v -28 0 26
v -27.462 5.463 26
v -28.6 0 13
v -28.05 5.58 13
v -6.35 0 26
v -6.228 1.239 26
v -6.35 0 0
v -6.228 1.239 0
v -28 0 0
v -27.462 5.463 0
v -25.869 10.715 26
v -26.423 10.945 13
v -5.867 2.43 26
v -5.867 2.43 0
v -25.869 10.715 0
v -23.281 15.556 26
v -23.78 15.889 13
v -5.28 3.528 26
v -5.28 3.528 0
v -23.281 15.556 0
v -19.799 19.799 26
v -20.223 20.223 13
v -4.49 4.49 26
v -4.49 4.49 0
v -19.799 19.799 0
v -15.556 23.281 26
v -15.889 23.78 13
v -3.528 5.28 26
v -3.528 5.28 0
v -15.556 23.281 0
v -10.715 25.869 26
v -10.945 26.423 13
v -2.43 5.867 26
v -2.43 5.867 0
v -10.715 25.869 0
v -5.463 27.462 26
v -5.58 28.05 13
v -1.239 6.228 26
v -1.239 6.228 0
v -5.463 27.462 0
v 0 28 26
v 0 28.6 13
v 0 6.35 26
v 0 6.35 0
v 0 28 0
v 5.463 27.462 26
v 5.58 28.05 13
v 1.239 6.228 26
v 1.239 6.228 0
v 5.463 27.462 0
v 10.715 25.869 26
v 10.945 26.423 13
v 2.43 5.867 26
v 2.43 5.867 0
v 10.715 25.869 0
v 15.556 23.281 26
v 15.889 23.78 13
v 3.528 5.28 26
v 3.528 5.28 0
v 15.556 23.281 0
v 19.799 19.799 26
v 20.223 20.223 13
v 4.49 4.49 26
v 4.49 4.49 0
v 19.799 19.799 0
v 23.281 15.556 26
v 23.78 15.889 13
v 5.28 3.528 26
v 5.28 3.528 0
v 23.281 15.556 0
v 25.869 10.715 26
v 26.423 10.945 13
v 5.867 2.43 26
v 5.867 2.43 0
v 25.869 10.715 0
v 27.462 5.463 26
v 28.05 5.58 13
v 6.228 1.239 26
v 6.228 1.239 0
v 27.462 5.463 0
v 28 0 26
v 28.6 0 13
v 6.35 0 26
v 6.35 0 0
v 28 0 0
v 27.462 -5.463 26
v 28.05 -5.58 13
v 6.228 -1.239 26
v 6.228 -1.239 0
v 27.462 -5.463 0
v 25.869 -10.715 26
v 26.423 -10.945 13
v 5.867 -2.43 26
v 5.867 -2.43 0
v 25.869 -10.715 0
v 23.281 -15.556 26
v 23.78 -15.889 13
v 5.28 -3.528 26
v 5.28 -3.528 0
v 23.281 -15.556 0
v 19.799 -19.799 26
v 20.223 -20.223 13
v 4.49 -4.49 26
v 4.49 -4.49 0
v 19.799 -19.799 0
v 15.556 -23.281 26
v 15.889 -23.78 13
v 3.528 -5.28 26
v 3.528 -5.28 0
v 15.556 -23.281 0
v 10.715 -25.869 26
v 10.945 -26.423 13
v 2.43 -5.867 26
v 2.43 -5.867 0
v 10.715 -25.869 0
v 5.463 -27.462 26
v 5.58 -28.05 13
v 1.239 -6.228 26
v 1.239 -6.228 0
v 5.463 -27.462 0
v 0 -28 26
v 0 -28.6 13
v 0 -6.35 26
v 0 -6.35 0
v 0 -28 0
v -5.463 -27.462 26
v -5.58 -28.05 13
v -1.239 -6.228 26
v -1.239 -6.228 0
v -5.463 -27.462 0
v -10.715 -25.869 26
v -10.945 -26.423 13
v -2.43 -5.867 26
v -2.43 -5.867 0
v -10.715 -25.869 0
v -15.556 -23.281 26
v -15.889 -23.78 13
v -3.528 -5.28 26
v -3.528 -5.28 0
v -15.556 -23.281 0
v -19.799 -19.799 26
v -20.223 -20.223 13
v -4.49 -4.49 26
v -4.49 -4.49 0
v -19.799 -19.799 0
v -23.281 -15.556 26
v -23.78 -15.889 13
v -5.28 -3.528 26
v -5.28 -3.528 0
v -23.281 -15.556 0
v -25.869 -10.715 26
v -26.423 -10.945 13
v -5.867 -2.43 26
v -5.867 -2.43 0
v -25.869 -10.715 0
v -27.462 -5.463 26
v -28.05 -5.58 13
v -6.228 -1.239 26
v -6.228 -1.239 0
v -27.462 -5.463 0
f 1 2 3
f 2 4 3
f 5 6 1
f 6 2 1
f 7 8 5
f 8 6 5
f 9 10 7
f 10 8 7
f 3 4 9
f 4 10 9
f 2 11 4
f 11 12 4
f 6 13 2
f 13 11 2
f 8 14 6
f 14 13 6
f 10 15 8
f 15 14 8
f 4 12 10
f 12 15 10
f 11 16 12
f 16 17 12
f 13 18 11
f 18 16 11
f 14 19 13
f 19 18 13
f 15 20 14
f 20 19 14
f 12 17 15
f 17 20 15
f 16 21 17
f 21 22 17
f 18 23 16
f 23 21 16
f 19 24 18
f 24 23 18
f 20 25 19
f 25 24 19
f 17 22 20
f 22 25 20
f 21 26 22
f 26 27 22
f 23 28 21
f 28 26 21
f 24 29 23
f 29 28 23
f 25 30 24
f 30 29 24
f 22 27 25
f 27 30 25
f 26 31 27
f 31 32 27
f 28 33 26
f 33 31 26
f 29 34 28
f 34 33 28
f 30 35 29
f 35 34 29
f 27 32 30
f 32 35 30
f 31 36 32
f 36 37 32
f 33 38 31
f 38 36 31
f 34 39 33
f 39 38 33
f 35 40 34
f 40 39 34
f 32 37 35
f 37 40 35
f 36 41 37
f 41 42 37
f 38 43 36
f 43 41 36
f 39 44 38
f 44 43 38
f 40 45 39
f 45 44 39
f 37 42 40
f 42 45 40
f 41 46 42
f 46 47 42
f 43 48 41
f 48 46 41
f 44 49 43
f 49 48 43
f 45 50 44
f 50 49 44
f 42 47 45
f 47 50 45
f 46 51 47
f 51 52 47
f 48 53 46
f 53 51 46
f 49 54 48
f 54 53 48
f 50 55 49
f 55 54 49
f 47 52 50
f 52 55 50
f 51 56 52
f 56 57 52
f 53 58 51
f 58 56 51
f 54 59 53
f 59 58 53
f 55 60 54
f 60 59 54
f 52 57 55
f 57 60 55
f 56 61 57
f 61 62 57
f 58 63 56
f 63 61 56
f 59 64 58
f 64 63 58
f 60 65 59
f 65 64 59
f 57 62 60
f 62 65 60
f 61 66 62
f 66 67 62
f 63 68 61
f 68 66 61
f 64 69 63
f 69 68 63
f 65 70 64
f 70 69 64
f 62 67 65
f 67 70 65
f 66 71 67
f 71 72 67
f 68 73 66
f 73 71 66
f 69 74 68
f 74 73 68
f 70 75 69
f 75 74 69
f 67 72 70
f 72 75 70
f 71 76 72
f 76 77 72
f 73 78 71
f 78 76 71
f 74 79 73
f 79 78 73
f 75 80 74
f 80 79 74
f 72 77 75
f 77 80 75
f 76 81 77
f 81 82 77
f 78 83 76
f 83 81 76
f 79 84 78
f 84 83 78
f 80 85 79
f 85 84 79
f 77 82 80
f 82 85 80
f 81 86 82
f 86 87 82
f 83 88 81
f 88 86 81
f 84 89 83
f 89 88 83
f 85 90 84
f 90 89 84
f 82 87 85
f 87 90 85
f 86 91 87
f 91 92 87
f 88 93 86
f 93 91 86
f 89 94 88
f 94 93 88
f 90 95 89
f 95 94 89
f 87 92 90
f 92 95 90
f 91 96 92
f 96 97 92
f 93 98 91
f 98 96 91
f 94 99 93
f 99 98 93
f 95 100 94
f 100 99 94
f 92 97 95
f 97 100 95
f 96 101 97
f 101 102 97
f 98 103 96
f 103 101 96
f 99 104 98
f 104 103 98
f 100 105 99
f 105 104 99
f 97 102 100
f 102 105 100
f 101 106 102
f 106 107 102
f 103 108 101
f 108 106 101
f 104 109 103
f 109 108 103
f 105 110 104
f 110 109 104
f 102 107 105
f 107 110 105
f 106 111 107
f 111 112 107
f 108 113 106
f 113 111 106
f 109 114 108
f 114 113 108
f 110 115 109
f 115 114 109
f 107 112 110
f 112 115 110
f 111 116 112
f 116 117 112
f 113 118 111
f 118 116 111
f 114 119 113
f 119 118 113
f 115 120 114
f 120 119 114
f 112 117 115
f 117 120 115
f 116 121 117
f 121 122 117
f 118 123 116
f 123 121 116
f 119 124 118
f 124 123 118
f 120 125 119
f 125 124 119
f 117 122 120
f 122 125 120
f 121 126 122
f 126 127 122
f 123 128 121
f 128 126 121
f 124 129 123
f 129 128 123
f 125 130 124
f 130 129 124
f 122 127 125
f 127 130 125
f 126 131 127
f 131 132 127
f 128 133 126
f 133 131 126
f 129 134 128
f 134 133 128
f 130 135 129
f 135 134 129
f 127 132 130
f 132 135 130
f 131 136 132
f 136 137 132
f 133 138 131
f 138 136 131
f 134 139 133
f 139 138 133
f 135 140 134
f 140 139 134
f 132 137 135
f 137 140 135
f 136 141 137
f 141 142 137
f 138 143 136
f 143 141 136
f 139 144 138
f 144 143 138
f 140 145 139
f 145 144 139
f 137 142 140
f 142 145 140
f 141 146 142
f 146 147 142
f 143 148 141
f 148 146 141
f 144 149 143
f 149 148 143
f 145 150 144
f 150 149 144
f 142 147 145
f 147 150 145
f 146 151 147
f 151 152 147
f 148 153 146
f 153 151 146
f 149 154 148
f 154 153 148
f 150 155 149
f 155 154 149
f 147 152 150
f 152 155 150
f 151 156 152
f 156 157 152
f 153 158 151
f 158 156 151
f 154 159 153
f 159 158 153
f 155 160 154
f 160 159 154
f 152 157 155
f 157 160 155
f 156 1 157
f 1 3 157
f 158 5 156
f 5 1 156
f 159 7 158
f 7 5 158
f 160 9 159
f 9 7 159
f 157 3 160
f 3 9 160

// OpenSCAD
$fn = 32;

// ----------------------------------------------------------------------
// Belt roller: 56 mm barrel, 26 mm wide, bore 12.7 mm
// ----------------------------------------------------------------------

// --- parameters (mm) ---
bore_d = 12.7;            // bore
barrel_d = 56;            // barrel diameter
roller_w = 26;            // roller width
crown = 0.6;              // crown height at mid width

roller_profile = [[6.35, 0], [28, 0], [28.6, 13], [28, 26], [6.35, 26]];

/* the profile stays clear of the axis, so the bore comes out of the revolve */
rotate_extrude() polygon(roller_profile);
